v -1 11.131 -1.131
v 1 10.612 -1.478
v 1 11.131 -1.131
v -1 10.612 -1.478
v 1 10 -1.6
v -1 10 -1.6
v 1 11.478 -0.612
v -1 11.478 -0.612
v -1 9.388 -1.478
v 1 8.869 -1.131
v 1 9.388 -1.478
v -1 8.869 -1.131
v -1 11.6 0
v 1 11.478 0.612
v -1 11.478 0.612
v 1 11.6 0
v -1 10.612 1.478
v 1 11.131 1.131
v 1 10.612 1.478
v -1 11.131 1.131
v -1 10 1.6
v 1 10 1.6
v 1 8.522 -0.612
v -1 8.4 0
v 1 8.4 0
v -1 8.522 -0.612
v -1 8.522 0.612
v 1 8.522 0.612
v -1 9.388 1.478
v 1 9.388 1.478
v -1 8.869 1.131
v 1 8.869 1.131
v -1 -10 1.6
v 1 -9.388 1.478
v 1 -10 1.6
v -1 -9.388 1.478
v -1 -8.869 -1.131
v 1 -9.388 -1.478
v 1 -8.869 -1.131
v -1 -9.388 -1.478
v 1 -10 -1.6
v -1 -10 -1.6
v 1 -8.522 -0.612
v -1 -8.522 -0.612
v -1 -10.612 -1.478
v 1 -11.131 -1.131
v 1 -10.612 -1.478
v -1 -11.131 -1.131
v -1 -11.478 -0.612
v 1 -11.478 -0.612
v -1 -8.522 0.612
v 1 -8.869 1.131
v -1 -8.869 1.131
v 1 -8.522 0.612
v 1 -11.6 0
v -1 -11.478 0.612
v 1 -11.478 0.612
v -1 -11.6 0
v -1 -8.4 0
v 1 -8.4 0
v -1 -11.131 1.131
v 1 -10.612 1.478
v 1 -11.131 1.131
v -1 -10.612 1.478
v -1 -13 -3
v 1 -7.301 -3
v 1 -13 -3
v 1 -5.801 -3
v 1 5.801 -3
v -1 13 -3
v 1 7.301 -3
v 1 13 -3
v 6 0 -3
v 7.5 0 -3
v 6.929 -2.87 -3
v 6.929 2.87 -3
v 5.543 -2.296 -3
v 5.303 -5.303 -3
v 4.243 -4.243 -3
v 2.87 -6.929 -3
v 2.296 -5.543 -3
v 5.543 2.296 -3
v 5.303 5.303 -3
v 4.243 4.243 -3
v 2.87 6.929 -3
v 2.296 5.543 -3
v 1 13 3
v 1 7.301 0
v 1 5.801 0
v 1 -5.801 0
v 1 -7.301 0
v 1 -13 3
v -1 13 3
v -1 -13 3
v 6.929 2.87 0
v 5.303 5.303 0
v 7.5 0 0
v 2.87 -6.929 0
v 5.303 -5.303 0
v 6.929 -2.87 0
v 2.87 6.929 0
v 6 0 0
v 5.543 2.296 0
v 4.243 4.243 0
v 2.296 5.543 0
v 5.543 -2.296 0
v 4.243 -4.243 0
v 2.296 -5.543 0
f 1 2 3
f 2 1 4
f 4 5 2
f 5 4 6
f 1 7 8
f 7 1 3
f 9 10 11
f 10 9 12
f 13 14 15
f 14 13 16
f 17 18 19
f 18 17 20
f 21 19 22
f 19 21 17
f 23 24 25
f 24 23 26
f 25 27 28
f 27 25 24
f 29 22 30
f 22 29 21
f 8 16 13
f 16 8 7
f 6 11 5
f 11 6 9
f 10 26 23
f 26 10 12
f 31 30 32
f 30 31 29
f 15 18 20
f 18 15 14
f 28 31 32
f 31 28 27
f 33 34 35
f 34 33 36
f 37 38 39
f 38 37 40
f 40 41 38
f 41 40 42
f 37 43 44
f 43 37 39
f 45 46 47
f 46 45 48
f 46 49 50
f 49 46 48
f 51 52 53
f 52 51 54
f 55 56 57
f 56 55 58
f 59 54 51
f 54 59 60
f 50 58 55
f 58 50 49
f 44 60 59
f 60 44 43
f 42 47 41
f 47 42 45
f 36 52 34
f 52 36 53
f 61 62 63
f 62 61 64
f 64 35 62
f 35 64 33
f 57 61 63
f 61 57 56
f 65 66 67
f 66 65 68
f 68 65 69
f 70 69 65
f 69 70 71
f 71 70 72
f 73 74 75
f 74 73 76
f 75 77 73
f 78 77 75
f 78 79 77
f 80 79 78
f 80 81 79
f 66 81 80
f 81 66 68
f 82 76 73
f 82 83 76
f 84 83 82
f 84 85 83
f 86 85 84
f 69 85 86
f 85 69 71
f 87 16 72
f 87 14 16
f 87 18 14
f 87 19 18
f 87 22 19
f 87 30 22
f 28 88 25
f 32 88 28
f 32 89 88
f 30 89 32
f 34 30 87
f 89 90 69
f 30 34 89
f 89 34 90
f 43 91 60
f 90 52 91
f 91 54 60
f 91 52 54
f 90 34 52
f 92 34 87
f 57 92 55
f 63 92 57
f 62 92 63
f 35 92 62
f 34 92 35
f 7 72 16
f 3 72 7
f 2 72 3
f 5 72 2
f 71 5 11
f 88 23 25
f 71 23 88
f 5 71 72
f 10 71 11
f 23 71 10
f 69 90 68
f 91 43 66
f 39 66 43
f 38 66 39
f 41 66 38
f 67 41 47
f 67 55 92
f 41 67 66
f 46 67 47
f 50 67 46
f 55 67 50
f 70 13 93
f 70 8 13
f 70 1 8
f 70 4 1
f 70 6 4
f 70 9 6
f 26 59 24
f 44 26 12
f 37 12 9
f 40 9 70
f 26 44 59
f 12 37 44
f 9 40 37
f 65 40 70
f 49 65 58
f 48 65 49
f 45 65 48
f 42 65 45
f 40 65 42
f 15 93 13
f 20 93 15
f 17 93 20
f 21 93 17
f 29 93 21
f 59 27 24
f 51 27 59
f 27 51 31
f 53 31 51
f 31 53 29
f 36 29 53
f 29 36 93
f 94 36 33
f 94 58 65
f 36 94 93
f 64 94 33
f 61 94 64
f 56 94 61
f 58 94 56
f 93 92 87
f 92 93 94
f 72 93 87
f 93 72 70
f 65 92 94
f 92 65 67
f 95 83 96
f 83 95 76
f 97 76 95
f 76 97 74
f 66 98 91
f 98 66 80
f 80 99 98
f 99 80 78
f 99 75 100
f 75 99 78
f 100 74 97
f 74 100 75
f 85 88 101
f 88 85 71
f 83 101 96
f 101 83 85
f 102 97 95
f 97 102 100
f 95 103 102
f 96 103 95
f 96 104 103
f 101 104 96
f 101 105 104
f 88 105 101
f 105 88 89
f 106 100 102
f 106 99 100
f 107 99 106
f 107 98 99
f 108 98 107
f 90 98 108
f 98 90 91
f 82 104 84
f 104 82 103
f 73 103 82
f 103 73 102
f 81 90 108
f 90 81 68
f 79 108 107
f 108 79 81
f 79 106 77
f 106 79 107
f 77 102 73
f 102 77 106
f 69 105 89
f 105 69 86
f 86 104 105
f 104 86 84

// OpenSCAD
$fn = 16;

union() {
	rotate([0, 90, 0])
		difference() {
			cube([6, 26, 2], center = true);
			for (a = [-1:2:1]) {
				translate([0, -10 * a, 0])
					cylinder(d = 3.2, h= 3, center = true);
			}
		}

	translate([0, 0, -1.5])
		difference() {
			cylinder(d = 15, h = 3, center = true);
			cylinder(d = 12, h = 3.2, center = true);
			translate([-10, 0, 0])
				cube([20, 20, 4], center = true);
		}
}
